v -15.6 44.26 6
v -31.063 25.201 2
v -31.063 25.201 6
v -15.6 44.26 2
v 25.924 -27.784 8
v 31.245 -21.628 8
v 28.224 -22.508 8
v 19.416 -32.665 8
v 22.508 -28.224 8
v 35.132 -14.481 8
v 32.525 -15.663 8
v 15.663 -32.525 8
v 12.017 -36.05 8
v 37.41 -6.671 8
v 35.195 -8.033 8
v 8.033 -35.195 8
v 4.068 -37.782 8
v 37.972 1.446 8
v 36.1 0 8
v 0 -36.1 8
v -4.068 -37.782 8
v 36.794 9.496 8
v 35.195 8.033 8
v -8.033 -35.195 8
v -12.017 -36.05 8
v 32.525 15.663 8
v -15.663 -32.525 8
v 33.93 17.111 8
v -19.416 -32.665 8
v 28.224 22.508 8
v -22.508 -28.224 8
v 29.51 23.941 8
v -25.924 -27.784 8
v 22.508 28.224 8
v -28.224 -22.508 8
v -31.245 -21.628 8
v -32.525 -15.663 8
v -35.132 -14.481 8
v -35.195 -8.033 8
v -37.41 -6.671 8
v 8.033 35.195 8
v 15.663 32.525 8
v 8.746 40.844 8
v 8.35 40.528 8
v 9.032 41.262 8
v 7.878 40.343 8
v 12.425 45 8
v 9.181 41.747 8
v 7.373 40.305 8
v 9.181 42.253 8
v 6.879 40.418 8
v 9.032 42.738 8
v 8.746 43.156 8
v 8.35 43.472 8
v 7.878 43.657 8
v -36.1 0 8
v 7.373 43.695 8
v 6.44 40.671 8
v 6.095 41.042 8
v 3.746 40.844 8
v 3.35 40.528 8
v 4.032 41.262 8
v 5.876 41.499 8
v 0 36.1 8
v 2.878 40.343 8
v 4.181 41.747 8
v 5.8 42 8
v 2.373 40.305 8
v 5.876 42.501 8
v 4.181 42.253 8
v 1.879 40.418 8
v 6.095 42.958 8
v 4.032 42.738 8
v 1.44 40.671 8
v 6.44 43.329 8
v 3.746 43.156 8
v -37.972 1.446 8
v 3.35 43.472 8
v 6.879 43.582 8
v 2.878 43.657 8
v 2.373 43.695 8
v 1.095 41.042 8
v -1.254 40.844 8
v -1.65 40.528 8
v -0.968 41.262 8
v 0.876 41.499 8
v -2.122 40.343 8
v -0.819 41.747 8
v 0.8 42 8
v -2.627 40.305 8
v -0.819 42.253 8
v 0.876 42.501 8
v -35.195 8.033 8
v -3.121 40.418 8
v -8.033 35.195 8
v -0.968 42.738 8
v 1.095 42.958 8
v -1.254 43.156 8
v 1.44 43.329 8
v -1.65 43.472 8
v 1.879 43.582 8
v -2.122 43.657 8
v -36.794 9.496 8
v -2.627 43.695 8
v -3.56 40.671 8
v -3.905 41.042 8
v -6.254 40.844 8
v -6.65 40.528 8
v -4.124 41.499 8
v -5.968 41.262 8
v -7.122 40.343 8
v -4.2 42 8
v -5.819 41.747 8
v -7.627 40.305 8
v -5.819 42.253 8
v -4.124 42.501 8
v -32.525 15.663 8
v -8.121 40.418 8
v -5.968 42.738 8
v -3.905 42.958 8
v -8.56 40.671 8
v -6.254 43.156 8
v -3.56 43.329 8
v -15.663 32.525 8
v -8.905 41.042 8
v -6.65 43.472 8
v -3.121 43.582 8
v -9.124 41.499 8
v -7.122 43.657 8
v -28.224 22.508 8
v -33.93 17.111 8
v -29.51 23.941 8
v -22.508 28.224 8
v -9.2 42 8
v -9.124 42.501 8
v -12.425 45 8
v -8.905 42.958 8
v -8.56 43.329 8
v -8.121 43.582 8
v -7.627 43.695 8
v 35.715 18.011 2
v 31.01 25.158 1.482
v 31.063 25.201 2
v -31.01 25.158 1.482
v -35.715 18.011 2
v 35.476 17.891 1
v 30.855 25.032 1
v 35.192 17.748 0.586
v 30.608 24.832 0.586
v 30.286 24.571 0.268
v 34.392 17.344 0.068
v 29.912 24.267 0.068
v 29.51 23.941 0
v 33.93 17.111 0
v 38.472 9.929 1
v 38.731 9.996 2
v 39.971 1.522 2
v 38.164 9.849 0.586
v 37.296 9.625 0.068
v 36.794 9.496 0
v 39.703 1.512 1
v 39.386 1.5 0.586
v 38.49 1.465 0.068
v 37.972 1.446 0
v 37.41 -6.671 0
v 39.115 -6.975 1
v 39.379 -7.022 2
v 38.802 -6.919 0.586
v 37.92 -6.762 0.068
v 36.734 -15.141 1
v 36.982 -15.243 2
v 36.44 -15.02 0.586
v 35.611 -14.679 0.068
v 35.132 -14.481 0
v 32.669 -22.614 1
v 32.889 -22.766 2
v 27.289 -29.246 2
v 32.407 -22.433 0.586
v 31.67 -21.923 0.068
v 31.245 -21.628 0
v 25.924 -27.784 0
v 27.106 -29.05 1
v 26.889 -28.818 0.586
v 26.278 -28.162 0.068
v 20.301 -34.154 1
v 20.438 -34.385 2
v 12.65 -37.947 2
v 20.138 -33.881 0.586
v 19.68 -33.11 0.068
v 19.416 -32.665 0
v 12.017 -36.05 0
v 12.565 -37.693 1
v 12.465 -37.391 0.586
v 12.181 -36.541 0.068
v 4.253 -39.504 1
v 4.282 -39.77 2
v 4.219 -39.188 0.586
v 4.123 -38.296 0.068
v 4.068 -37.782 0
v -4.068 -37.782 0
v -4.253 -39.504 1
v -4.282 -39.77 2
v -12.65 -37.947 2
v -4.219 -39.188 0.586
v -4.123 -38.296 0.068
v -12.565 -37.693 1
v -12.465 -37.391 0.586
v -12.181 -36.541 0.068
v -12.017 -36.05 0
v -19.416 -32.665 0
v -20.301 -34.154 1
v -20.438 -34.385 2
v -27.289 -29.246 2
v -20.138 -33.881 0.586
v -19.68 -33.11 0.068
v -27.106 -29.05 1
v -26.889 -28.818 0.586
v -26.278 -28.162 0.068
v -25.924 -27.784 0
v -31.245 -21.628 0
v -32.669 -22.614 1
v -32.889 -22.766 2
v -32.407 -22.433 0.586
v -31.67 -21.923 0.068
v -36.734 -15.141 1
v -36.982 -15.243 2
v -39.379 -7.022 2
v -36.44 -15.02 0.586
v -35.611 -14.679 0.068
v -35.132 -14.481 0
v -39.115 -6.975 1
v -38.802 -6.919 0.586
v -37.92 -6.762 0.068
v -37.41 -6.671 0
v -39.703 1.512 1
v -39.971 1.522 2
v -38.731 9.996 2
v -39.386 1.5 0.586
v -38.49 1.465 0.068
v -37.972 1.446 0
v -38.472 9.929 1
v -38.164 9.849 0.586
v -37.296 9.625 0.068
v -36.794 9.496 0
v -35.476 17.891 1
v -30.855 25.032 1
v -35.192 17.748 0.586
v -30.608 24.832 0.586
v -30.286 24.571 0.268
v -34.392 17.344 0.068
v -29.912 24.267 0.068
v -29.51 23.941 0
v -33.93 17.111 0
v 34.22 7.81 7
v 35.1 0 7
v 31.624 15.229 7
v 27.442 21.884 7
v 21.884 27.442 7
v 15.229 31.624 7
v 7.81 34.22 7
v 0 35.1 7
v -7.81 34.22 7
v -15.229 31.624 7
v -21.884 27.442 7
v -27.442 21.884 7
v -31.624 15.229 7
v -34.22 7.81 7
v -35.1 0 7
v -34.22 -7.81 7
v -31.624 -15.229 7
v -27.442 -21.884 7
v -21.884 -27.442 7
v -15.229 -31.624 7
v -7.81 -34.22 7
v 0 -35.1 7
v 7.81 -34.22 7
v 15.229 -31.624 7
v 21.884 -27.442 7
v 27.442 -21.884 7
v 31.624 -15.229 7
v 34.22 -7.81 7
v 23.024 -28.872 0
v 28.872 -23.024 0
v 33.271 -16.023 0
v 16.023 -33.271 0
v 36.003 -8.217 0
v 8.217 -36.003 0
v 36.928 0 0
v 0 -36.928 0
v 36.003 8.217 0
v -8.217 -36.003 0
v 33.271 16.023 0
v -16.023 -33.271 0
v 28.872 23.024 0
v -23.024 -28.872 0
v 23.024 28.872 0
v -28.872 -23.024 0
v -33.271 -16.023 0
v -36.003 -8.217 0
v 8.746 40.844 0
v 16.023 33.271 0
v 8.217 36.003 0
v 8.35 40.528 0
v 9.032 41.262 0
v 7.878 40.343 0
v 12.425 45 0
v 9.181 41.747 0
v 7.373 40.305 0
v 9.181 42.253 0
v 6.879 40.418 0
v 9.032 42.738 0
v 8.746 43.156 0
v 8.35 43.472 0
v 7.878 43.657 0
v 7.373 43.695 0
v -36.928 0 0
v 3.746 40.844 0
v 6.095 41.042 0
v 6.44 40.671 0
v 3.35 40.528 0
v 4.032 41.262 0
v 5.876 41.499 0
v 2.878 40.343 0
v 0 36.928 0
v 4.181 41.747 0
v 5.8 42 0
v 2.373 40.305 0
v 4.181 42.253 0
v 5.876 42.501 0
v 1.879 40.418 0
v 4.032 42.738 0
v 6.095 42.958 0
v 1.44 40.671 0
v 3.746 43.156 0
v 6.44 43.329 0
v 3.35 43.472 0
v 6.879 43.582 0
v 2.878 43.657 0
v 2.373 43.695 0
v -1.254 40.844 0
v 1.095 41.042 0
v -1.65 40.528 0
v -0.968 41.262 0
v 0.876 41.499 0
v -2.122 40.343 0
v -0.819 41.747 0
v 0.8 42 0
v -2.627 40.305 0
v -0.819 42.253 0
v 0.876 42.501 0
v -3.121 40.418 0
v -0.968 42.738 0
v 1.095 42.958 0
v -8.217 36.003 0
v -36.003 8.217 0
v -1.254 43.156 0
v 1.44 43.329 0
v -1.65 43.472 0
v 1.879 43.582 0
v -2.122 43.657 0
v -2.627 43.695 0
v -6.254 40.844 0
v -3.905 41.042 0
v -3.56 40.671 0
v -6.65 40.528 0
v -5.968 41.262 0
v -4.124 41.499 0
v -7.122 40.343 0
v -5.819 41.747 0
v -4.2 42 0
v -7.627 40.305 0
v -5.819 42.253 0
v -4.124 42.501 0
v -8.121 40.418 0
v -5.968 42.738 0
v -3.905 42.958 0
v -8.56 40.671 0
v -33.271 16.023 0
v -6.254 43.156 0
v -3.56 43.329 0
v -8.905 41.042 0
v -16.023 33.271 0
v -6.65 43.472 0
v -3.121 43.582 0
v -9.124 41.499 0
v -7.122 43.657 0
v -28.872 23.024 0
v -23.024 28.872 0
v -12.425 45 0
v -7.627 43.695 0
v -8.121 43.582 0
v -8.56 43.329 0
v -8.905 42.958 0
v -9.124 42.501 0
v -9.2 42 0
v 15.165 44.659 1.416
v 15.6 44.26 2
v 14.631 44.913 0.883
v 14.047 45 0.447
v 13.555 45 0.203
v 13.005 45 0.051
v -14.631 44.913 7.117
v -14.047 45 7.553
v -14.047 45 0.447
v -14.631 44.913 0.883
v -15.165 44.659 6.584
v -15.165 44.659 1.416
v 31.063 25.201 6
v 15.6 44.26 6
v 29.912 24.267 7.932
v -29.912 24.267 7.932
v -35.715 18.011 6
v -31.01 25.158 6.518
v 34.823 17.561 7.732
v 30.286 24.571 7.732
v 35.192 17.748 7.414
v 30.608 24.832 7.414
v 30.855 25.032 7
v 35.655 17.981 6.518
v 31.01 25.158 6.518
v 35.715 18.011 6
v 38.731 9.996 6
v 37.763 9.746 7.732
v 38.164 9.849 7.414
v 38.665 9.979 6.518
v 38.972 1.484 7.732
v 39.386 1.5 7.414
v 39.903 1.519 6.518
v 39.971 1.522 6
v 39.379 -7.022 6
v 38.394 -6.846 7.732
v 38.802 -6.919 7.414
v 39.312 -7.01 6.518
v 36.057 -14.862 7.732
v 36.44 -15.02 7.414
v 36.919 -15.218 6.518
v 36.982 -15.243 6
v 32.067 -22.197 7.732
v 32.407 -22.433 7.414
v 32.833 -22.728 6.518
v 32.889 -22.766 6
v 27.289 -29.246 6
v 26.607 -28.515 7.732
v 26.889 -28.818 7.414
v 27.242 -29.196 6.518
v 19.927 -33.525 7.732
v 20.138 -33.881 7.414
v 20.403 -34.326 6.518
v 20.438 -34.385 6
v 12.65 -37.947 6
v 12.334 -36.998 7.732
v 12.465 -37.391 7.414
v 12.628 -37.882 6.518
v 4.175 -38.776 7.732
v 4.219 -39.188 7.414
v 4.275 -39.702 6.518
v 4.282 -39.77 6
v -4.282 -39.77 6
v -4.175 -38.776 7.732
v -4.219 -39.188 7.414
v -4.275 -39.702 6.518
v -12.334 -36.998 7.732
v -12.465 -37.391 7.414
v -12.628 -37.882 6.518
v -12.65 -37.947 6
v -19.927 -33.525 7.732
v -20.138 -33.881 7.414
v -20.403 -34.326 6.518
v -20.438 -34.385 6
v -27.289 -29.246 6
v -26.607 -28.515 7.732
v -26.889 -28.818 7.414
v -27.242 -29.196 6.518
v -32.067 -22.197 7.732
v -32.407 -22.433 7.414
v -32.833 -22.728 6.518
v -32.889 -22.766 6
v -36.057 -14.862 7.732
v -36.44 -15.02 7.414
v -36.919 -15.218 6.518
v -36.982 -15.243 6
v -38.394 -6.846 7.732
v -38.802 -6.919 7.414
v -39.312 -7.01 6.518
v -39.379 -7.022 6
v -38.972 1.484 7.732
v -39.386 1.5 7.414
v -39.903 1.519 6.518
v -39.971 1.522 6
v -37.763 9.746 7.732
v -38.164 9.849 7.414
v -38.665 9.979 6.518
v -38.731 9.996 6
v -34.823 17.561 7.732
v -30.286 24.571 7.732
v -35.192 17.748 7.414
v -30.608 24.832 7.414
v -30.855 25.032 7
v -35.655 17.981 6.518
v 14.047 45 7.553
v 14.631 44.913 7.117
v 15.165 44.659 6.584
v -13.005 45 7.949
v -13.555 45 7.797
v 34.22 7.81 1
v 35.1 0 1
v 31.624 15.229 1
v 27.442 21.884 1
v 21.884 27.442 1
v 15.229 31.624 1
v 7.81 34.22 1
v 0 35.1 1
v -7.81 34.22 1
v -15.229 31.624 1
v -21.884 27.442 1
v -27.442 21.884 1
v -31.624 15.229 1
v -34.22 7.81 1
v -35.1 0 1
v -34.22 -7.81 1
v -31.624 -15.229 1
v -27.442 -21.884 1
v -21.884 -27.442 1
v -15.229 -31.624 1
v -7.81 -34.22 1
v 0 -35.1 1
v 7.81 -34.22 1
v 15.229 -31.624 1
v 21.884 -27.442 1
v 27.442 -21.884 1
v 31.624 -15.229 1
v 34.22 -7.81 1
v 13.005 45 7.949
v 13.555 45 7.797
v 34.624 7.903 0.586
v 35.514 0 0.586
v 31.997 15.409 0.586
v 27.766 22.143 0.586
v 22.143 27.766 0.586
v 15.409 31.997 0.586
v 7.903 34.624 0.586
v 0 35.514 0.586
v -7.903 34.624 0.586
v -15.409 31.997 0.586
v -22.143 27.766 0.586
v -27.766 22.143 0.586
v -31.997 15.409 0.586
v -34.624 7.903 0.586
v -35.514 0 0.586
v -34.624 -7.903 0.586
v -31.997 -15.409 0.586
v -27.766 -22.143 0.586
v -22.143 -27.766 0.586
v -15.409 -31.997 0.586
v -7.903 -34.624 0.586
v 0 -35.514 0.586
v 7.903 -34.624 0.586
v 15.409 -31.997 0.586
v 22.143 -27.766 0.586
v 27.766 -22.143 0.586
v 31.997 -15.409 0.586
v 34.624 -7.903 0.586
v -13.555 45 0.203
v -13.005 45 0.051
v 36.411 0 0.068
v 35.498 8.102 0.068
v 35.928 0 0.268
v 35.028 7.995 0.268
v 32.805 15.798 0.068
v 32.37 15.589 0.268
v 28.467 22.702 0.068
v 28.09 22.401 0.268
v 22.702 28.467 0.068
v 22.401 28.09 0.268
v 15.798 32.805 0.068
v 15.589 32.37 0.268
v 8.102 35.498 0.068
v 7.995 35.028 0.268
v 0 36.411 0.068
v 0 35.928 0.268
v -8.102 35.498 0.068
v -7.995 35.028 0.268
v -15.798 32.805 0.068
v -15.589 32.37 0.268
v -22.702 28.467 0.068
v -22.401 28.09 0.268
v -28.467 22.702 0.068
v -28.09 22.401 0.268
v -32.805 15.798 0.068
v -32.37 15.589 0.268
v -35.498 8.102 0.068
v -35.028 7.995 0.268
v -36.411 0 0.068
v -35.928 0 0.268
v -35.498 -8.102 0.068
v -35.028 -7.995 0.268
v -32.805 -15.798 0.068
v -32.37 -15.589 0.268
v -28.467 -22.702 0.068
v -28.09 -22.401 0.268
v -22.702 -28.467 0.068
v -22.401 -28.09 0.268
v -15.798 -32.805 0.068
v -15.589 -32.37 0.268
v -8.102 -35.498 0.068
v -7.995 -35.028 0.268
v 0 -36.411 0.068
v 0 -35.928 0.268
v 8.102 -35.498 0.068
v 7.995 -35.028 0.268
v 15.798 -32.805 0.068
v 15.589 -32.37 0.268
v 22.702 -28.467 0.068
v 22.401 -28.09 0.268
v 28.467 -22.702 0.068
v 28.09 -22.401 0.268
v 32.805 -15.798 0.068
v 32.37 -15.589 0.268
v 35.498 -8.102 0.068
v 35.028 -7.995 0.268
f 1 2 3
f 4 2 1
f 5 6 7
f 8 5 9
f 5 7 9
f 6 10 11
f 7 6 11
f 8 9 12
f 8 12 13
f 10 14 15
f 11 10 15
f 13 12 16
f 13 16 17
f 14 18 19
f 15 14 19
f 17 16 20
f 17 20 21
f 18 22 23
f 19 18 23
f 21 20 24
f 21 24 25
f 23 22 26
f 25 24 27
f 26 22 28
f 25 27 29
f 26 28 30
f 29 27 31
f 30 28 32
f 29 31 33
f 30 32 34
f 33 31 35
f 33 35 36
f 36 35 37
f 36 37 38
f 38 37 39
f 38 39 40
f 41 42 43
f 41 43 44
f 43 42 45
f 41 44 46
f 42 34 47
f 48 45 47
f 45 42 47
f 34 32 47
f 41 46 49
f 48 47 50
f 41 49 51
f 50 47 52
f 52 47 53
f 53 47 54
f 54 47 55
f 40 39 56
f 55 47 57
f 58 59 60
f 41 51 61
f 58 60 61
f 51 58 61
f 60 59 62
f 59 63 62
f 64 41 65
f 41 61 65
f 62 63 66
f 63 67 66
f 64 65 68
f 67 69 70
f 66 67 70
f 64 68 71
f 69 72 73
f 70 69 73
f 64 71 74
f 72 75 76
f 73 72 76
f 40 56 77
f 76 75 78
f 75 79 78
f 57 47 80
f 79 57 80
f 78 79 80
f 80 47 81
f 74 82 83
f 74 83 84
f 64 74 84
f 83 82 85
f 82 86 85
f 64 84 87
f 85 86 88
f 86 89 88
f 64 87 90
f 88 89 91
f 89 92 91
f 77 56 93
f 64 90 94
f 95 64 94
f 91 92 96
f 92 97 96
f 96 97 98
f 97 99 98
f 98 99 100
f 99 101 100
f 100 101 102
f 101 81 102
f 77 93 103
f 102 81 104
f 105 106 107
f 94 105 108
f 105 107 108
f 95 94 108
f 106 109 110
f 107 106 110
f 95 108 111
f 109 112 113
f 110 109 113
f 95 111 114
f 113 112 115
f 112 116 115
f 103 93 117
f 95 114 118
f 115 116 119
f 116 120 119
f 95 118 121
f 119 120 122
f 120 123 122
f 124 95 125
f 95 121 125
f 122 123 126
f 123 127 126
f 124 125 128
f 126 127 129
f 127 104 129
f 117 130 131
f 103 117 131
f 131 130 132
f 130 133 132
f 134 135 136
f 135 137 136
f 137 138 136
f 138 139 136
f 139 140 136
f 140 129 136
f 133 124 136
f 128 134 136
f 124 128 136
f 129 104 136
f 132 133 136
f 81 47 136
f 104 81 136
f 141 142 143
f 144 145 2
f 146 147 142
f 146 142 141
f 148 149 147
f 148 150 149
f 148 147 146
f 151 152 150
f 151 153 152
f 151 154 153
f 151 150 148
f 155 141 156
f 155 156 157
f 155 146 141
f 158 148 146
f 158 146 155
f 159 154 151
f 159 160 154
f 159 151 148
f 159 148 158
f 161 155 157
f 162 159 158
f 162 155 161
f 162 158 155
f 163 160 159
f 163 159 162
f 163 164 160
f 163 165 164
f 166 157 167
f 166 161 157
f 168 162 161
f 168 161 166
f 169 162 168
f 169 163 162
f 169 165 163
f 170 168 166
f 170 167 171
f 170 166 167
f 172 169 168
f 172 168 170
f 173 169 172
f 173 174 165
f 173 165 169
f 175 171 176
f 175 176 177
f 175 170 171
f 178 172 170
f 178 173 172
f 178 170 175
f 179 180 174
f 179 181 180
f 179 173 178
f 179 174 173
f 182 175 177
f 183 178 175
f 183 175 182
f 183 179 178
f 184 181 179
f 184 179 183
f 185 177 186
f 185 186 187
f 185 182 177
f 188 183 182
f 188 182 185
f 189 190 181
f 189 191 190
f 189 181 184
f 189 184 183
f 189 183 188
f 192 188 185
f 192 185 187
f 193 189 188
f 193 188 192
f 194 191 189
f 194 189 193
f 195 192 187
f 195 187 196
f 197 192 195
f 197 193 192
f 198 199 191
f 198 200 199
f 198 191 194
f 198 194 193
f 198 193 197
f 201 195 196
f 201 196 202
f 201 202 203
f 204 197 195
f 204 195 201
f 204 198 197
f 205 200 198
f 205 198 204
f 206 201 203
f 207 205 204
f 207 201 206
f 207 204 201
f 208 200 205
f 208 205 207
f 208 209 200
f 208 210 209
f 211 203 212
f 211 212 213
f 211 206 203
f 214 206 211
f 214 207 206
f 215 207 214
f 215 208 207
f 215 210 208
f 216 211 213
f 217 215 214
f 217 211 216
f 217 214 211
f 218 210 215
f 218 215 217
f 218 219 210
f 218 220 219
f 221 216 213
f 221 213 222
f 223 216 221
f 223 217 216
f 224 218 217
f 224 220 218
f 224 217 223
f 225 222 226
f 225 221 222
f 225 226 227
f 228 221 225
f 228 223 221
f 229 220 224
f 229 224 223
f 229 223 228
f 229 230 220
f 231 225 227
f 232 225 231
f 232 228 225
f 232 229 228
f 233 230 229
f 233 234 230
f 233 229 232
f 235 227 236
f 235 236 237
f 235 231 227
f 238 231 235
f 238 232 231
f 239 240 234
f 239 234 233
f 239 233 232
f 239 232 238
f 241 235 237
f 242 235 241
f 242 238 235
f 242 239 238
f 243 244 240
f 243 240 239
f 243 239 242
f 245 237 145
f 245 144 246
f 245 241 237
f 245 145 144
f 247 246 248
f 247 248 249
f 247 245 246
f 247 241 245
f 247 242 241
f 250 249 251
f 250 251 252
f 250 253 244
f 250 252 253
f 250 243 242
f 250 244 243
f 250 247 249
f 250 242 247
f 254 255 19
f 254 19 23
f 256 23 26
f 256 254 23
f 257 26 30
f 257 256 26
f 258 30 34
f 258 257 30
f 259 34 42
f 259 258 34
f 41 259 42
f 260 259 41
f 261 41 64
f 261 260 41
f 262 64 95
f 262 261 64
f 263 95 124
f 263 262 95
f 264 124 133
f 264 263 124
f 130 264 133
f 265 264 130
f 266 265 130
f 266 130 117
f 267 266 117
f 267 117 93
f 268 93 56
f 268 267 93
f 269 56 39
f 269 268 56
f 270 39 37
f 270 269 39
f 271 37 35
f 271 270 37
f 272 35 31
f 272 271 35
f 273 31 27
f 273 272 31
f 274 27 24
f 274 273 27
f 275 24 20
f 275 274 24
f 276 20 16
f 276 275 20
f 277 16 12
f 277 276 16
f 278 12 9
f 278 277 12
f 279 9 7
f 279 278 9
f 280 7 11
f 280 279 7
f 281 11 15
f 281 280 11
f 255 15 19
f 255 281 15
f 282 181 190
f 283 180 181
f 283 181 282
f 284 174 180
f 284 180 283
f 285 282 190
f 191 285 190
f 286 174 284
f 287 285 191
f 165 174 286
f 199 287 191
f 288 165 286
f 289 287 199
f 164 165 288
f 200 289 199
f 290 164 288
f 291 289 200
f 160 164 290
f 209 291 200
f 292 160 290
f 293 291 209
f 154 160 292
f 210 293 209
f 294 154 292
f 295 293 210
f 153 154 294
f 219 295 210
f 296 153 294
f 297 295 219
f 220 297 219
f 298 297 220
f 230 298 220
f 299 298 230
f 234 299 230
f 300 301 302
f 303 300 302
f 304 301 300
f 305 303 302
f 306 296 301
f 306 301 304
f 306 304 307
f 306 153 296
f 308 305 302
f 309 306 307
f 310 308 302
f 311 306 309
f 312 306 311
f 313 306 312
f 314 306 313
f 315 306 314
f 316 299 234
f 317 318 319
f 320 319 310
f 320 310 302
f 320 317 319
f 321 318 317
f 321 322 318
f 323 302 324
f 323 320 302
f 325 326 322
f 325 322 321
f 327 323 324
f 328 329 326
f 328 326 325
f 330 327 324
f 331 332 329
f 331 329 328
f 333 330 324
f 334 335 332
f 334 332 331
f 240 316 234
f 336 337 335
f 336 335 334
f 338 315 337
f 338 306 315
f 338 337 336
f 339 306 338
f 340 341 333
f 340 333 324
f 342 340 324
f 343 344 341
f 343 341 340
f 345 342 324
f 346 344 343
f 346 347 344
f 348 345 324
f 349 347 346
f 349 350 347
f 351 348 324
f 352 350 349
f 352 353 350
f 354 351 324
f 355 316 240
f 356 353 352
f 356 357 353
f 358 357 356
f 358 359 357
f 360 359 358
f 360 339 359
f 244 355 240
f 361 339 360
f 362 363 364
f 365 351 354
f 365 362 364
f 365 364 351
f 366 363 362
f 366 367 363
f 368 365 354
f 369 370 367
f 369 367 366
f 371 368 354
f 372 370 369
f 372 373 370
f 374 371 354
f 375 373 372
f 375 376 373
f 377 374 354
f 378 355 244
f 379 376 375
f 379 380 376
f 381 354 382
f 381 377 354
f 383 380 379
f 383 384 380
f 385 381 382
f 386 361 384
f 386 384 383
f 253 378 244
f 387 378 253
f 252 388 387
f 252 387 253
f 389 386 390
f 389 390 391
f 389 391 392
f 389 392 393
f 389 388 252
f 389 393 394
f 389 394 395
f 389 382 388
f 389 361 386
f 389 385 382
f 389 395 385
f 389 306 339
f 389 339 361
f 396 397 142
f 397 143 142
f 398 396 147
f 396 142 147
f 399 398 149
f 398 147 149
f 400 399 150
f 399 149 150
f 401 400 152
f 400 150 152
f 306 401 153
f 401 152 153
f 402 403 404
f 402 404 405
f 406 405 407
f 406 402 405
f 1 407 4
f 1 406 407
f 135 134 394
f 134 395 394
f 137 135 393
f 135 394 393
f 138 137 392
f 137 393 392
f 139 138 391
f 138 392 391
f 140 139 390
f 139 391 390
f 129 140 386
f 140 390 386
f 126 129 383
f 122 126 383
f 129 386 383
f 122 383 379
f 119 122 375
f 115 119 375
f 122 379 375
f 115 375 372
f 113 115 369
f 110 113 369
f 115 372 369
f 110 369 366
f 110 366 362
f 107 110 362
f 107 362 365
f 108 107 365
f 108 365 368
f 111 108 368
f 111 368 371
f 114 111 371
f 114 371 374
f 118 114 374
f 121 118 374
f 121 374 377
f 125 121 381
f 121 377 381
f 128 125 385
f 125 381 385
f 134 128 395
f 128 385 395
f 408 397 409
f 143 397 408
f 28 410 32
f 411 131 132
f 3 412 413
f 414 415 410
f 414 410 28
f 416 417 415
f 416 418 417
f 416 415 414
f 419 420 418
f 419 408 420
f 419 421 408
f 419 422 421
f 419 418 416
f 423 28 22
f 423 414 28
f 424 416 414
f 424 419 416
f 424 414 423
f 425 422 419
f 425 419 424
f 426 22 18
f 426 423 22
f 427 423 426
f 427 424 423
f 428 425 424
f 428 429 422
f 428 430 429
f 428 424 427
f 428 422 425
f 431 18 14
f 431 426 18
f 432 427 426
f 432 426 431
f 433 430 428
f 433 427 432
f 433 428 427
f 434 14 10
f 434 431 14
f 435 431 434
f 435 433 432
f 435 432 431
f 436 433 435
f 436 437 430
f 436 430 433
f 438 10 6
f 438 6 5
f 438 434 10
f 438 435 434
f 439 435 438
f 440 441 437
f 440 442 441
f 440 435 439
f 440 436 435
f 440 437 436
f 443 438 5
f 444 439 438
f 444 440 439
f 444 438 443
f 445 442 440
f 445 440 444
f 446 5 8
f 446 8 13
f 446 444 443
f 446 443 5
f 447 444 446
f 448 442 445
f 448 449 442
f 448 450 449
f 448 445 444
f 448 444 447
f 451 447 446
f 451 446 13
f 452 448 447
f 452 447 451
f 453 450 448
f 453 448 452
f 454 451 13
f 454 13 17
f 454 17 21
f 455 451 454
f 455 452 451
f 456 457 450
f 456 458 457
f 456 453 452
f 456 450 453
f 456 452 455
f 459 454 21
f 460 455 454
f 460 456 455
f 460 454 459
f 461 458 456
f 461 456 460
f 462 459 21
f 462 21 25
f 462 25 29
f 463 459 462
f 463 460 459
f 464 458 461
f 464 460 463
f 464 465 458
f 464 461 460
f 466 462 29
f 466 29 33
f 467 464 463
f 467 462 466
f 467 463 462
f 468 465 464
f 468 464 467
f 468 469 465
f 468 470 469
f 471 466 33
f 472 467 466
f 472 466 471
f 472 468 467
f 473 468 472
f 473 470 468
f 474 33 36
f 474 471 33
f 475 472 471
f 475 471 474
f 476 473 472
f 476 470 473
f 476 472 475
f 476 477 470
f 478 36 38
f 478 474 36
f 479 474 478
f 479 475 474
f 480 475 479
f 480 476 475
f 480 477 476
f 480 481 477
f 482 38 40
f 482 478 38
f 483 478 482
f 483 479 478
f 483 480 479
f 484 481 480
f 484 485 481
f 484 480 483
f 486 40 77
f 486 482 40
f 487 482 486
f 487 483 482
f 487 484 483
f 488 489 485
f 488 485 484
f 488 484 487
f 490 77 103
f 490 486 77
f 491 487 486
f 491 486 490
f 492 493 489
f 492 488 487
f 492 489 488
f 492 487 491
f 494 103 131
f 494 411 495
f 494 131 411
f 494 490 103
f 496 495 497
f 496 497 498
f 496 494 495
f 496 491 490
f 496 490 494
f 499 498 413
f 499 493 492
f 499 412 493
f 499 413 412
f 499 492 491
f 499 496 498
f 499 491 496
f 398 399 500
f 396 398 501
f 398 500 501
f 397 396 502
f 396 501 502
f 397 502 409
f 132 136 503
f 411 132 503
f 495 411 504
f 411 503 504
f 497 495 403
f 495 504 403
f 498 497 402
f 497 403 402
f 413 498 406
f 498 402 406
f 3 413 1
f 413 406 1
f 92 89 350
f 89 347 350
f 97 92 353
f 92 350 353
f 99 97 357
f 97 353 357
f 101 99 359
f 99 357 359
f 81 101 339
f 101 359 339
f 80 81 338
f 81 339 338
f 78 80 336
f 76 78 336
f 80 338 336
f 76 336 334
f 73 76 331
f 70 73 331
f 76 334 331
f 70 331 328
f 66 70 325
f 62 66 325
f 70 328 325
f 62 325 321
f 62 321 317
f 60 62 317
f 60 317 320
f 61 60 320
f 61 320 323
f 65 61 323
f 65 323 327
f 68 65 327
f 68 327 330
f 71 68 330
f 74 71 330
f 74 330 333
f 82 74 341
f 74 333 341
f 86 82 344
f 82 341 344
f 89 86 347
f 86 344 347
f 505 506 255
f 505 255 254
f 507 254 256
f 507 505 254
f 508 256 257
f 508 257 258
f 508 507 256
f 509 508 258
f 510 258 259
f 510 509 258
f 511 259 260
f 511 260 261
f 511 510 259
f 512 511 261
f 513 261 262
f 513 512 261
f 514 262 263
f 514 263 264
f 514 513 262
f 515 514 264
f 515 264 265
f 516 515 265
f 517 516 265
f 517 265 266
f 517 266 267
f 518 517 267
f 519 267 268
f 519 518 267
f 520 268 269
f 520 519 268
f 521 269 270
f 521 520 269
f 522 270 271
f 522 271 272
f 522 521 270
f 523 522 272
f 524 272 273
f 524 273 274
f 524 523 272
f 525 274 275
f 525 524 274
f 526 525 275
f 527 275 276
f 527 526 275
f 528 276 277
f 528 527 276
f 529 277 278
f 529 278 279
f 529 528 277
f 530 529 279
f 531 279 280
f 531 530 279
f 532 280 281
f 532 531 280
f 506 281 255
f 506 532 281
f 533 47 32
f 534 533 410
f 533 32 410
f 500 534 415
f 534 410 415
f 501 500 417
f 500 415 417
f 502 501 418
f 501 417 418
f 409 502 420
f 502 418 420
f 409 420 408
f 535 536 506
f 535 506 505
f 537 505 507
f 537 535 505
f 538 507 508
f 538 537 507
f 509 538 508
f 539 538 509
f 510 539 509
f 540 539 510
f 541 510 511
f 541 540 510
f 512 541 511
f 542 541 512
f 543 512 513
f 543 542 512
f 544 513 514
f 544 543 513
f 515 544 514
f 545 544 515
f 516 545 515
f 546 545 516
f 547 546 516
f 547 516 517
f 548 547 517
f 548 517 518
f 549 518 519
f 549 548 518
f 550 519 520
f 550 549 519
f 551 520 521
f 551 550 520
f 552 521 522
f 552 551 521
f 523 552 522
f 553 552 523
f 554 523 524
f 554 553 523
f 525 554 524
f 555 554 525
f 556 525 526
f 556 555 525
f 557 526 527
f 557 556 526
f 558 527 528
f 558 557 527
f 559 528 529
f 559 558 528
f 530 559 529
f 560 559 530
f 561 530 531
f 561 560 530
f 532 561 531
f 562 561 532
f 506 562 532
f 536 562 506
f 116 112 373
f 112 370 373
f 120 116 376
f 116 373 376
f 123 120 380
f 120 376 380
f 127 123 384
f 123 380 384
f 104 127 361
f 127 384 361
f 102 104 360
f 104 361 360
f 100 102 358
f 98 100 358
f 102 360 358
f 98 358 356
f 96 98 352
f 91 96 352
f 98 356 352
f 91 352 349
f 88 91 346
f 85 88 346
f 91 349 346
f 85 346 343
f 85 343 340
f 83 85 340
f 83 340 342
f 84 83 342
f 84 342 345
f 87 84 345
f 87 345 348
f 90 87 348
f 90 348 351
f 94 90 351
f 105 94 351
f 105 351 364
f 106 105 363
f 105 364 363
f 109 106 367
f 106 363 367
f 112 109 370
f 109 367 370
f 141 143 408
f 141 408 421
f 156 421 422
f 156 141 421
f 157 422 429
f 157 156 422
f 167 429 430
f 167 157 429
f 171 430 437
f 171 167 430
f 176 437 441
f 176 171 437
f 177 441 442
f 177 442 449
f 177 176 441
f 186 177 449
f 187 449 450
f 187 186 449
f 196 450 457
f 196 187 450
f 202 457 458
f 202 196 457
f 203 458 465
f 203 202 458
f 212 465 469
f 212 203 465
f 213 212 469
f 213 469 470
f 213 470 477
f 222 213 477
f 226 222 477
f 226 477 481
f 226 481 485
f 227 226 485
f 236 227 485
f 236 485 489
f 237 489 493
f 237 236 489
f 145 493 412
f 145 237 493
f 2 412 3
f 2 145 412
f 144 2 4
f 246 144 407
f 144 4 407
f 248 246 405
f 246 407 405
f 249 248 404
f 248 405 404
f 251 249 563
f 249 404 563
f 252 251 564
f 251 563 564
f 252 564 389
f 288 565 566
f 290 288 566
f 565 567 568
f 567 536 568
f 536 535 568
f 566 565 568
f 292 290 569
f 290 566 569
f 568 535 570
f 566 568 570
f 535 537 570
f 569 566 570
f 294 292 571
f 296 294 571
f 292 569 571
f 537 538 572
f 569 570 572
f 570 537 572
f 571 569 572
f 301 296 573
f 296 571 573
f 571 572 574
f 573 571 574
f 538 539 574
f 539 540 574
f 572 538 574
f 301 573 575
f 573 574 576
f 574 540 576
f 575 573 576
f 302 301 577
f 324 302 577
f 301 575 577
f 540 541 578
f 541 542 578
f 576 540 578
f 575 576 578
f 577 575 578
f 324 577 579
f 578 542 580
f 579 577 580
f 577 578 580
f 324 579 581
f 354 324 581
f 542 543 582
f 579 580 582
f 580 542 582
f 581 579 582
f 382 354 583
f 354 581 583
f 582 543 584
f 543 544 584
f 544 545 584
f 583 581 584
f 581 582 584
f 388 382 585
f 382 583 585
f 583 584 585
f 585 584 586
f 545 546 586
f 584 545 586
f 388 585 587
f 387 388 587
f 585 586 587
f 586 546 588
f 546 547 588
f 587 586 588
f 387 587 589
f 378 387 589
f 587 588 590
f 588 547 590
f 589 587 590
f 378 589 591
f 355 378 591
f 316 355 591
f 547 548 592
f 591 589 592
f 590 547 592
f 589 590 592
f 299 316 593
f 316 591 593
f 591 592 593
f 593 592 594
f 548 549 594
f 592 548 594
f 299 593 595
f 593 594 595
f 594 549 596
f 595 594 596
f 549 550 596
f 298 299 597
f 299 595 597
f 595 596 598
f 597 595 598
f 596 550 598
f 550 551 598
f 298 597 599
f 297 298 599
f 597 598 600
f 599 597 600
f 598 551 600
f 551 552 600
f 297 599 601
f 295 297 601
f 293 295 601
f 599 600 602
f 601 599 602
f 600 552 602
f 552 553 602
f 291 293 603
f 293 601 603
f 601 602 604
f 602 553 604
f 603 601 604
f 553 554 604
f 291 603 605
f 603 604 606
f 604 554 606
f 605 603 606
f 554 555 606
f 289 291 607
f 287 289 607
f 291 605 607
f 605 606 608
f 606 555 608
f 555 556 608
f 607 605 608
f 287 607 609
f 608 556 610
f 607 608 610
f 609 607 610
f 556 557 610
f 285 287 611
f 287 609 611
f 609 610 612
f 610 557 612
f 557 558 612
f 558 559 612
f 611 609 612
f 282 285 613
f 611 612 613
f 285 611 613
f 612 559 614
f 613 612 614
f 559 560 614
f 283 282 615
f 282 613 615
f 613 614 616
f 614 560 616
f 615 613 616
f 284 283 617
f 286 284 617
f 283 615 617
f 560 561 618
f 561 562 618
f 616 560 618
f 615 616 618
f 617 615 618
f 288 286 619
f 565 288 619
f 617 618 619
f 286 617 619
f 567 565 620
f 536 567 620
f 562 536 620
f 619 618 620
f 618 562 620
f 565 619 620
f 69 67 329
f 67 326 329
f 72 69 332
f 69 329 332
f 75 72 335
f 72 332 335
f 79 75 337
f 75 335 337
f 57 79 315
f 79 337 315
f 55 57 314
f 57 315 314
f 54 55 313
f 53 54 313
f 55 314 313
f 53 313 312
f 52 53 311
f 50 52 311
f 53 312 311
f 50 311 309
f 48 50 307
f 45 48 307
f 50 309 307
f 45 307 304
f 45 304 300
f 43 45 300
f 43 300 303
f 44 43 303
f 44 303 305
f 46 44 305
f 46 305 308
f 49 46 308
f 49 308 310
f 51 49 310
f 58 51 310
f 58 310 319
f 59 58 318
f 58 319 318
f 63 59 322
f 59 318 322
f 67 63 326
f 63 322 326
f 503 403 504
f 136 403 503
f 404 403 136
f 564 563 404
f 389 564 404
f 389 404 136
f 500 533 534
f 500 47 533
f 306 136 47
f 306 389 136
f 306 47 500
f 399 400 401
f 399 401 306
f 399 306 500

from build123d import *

# Parameters (mm, degrees)
SKETCH1_R                = 35.1
BOSS_EXTRUDE1_DEPTH      = 8
M3_CLEARANCE_HOLE1_D     = 3.4
M3_CLEARANCE_HOLE1_DEPTH = 8
M3_CLEARANCE_HOLE1_TIP   = 1.021463052
CHAMFER1_SIZE            = 1
FILLET1_R                = 2


with BuildPart() as part:
    # Sketch1 → Boss-Extrude1 (new body)
    with BuildSketch(Plane.XY):
        with BuildLine():
            Line((-15, 45), (0, 45))
            Line((0, 45), (15, 45))
            Line((15, 45), (31.062744721, 25.201307315))
            ThreePointArc((31.062744721, 25.201307315), (0, -40), (-31.062744721, 25.201307315))
            Line((-31.062744721, 25.201307315), (-15, 45))
        make_face()
        Circle(SKETCH1_R, mode=Mode.SUBTRACT)
    extrude(amount=BOSS_EXTRUDE1_DEPTH)

    # M3 Clearance Hole1
    with Locations(Plane.XY.offset(8)):
        with Locations((7.5, 42), (-2.5, 42), (-7.5, 42), (2.5, 42)):
            Hole(M3_CLEARANCE_HOLE1_D / 2, depth=M3_CLEARANCE_HOLE1_DEPTH)
            with Locations((0, 0, -(M3_CLEARANCE_HOLE1_DEPTH + M3_CLEARANCE_HOLE1_TIP / 2))):  # 118° drill point
                Cone(0, M3_CLEARANCE_HOLE1_D / 2, M3_CLEARANCE_HOLE1_TIP, mode=Mode.SUBTRACT)

    # Chamfer1
    chamfer1_edges = [part.edges().sort_by_distance(p)[0] for p in [
        (-35.1, 0, 0),
        (-35.1, 0, 8),
    ]]
    chamfer(chamfer1_edges, length=CHAMFER1_SIZE)

    # Fillet1
    fillet1_edges = [part.edges().sort_by_distance(p)[0] for p in [
        (23.031372361, 35.100653658, 8),
        (-36.1, 0, 0),
        (-23.031372361, 35.100653658, 8),
        (23.031372361, 35.100653658, 0),
        (0, -40, 0),
        (-23.031372361, 35.100653658, 0),
        (0, -40, 8),
        (-15, 45, 4),
        (15, 45, 4),
    ]]
    fillet(fillet1_edges, radius=FILLET1_R)


solid = part.part
